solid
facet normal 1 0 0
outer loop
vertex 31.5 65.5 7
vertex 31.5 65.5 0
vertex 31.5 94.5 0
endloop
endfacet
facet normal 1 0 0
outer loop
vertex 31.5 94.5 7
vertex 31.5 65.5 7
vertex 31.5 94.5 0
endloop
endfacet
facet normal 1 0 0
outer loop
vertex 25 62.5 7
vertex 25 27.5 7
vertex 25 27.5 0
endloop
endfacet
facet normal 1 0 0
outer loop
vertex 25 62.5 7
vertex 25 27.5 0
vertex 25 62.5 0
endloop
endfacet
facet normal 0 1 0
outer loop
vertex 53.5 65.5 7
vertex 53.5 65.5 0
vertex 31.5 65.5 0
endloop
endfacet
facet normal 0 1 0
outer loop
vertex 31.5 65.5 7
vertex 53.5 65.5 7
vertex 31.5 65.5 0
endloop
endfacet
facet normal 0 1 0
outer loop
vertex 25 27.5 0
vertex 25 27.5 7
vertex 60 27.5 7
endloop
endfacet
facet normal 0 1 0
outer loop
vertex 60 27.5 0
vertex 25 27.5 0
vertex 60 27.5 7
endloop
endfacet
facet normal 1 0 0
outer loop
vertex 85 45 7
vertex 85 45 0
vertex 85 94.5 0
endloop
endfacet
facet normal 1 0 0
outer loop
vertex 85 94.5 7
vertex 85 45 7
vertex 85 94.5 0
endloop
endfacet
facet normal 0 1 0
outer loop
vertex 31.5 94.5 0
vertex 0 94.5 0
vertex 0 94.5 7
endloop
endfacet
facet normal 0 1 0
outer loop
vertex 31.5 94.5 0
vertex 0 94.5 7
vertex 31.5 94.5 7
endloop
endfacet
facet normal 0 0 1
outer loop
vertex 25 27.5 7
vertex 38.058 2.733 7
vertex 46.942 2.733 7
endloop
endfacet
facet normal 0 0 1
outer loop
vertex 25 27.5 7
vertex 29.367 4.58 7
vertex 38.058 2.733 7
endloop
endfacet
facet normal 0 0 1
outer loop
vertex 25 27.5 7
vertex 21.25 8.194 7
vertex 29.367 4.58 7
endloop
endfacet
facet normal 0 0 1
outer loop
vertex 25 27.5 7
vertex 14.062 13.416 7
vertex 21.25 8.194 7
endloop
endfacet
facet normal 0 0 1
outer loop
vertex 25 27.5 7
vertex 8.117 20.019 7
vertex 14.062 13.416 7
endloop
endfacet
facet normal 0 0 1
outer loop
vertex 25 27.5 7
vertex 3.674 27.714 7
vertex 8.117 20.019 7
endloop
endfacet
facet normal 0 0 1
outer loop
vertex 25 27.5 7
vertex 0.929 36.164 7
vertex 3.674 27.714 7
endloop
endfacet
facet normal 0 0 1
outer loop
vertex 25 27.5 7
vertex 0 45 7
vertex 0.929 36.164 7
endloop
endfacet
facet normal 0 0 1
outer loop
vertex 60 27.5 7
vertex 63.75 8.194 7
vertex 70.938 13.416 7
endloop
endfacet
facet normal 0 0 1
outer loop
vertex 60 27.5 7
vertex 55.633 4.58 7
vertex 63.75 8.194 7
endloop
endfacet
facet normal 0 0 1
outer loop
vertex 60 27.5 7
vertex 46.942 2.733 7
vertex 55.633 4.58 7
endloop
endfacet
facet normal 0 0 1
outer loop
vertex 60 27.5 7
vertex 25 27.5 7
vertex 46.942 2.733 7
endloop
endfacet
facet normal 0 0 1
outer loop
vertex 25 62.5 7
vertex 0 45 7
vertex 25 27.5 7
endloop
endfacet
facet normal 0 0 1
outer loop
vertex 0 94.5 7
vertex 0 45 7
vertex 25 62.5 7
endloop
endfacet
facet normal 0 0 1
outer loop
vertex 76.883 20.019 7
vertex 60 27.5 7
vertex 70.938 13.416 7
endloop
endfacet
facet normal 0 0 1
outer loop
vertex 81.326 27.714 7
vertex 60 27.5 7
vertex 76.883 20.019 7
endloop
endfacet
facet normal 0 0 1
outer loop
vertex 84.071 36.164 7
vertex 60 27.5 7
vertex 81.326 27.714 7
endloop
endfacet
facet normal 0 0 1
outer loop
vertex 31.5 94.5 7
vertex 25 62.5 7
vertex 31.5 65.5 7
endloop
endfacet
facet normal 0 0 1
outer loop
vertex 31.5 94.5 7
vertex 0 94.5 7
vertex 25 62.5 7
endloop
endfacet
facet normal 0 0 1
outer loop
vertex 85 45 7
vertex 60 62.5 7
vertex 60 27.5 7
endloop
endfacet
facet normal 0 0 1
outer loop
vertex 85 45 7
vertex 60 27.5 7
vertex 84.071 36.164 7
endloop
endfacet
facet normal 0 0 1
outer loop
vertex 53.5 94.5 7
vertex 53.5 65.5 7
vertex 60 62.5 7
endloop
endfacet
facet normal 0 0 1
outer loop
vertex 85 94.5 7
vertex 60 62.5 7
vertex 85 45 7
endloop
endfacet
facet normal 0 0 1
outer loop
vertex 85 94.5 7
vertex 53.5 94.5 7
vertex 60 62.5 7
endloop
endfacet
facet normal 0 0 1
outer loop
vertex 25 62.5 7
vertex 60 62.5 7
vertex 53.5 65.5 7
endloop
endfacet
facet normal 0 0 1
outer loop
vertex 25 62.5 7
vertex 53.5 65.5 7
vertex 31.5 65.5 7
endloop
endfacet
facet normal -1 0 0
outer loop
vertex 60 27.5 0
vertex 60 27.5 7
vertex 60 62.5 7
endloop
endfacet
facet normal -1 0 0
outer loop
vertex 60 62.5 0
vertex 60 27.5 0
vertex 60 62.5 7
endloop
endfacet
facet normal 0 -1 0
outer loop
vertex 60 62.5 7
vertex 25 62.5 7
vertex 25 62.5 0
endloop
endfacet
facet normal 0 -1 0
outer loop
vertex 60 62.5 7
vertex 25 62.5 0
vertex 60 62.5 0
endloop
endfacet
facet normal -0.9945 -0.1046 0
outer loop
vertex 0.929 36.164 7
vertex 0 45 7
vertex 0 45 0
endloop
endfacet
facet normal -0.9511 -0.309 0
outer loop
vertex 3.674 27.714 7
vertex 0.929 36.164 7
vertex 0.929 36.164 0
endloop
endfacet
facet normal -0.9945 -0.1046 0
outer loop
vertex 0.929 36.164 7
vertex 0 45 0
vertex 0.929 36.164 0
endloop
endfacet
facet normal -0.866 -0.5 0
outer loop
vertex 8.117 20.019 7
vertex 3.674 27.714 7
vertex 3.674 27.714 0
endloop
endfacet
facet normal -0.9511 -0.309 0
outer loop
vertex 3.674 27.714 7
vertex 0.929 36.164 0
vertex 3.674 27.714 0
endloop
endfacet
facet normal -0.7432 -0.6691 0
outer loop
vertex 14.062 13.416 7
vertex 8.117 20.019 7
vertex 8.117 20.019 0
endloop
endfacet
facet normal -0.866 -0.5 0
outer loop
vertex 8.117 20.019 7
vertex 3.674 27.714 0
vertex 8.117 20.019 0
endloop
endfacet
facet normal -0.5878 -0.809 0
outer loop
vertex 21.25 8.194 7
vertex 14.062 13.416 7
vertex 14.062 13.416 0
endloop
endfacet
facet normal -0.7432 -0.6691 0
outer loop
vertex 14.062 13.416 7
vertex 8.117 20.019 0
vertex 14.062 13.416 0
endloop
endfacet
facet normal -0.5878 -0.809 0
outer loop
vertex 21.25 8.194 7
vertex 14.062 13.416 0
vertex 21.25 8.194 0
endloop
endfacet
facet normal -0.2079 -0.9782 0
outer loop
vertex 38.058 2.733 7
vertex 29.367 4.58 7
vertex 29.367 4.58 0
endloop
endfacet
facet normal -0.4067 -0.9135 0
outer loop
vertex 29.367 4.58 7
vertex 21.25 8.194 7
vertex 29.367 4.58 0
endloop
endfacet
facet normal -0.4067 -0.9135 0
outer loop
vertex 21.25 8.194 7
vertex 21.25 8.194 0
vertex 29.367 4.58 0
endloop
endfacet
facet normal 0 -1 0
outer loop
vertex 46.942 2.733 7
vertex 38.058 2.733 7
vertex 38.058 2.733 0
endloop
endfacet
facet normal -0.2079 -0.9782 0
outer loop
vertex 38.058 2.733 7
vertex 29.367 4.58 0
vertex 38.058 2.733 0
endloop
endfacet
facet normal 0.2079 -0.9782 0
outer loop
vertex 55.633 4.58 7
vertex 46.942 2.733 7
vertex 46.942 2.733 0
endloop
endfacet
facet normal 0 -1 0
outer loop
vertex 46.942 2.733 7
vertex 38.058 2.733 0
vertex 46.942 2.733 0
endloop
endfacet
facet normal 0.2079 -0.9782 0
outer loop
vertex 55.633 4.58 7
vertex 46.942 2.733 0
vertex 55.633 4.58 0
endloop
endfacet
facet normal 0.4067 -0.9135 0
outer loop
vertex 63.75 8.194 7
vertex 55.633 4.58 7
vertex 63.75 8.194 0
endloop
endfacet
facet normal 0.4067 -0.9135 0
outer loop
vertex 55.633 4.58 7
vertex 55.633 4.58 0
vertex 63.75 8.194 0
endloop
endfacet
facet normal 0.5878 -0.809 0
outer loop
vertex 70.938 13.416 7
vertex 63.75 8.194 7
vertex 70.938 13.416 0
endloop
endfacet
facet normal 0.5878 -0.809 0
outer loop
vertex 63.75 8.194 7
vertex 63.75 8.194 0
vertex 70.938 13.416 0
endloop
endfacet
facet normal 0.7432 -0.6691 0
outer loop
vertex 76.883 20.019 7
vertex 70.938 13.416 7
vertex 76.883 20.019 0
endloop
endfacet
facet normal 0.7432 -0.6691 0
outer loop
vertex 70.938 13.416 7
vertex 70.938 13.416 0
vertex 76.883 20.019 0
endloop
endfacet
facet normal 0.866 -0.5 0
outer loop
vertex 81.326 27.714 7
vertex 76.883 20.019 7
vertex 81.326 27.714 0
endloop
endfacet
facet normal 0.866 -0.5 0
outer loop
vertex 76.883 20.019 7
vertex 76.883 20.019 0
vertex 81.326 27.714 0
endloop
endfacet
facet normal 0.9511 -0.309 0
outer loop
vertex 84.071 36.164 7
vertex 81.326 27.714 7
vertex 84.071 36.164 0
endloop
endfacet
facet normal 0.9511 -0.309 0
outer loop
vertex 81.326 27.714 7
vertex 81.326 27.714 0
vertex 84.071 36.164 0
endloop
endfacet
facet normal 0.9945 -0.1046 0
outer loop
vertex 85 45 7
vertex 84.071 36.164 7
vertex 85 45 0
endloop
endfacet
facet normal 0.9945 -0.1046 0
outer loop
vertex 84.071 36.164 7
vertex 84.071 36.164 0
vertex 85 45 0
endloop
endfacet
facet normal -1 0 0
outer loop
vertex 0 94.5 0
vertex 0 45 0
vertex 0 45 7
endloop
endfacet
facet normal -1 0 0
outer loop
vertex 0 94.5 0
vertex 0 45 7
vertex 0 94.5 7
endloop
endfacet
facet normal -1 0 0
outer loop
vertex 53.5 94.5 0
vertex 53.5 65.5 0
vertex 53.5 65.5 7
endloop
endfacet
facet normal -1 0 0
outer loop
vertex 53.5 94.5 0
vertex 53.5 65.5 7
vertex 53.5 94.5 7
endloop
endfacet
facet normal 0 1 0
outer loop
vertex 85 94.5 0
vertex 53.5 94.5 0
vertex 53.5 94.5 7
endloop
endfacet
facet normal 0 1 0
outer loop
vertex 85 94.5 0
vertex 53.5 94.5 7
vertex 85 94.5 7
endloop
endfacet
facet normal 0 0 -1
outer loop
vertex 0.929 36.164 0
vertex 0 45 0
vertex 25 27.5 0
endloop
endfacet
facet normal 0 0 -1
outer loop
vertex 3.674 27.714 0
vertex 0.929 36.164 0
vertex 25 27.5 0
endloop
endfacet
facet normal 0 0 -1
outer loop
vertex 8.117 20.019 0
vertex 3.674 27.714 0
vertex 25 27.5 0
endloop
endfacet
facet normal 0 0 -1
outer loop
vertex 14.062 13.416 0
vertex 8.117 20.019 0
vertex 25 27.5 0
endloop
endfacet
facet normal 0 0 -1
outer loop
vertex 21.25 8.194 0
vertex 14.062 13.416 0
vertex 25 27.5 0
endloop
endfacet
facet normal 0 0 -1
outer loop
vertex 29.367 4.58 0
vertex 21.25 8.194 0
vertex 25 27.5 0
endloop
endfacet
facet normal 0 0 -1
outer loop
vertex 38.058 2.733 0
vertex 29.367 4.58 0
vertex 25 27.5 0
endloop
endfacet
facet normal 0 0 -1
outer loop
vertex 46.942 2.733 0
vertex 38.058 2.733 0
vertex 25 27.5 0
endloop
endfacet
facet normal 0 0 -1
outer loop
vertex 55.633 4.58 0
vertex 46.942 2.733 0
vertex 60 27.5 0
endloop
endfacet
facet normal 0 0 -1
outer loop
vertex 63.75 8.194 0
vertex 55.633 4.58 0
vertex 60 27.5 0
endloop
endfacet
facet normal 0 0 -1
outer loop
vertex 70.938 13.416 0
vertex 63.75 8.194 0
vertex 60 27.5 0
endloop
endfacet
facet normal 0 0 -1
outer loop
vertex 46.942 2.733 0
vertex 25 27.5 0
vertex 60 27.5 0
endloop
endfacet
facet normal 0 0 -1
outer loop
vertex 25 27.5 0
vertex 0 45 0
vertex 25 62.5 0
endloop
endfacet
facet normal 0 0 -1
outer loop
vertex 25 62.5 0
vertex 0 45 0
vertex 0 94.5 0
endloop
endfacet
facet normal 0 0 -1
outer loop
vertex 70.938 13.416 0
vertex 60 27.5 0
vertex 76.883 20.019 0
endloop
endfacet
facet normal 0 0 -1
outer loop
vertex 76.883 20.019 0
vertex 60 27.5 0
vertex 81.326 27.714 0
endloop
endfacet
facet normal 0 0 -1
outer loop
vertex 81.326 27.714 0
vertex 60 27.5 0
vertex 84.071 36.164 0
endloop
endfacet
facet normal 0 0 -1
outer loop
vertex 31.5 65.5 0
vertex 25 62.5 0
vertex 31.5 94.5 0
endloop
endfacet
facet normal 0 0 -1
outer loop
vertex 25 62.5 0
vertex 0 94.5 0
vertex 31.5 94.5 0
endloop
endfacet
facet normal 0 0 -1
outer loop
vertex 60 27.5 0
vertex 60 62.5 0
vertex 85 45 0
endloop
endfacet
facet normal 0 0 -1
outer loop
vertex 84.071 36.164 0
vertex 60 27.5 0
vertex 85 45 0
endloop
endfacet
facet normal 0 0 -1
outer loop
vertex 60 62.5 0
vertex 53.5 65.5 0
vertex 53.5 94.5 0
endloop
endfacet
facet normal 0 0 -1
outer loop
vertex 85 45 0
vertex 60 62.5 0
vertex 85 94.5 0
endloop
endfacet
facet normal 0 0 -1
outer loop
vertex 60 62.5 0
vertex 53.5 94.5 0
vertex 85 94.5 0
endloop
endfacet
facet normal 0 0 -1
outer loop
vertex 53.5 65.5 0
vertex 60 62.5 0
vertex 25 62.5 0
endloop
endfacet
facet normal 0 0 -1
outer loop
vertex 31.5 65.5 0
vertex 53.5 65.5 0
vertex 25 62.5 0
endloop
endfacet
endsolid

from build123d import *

# Parameters (mm, degrees)
SKETCH1_W           = 85
SKETCH1_H           = 95
BOSS_EXTRUDE1_DEPTH = 7
SKETCH2_W           = 35
SKETCH2_H           = 35
CUT_EXTRUDE1_DEPTH  = 7
CUT_EXTRUDE4_DEPTH  = 10
SKETCH12_W          = 22
SKETCH12_H          = 29.5
CUT_EXTRUDE9_DEPTH  = 10
SKETCH13_W          = 31.5
SKETCH13_H          = 7
CUT_EXTRUDE10_DEPTH = 0.5


with BuildPart() as part:
    # Sketch1 → Boss-Extrude1 (new body)
    with BuildSketch(Plane.XY):
        with Locations((42.5, 47.5)):
            Rectangle(SKETCH1_W, SKETCH1_H)
    extrude(amount=BOSS_EXTRUDE1_DEPTH)

    # Sketch2 → Cut-Extrude1 (cut)
    with BuildSketch(Plane.XY.offset(7)):
        with Locations((42.5, 45)):
            Rectangle(SKETCH2_W, SKETCH2_H)
    extrude(amount=-CUT_EXTRUDE1_DEPTH, mode=Mode.SUBTRACT)

    # Sketch7 → Cut-Extrude4 (cut)
    with BuildSketch(Plane(origin=(0, 0, 0), x_dir=(-1, 0, 0), z_dir=(0, 0, -1))):
        with BuildLine():
            Line((-85, 45), (-85, 0))
            Line((-85, 0), (0, 0))
            Line((0, 0), (0, 45))
            ThreePointArc((0, 45), (-42.5, 2.5), (-85, 45))
        make_face()
    extrude(amount=-CUT_EXTRUDE4_DEPTH, mode=Mode.SUBTRACT)

    # Sketch12 → Cut-Extrude9 (cut)
    with BuildSketch(Plane(origin=(0, 0, 0), x_dir=(-1, 0, 0), z_dir=(0, 0, -1))):
        with Locations((-42.5, 80.25)):
            Rectangle(SKETCH12_W, SKETCH12_H)
    extrude(amount=-CUT_EXTRUDE9_DEPTH, mode=Mode.SUBTRACT)

    # Sketch13 → Cut-Extrude10 (cut)
    with BuildSketch(Plane(origin=(0, 95, 0), x_dir=(1, 0, 0), z_dir=(0, 1, 0))):
        with Locations((15.75, -3.5)):
            Rectangle(SKETCH13_W, SKETCH13_H)
        with Locations((69.25, -3.5)):
            Rectangle(SKETCH13_W, SKETCH13_H)
    extrude(amount=-CUT_EXTRUDE10_DEPTH, mode=Mode.SUBTRACT)


solid = part.part
